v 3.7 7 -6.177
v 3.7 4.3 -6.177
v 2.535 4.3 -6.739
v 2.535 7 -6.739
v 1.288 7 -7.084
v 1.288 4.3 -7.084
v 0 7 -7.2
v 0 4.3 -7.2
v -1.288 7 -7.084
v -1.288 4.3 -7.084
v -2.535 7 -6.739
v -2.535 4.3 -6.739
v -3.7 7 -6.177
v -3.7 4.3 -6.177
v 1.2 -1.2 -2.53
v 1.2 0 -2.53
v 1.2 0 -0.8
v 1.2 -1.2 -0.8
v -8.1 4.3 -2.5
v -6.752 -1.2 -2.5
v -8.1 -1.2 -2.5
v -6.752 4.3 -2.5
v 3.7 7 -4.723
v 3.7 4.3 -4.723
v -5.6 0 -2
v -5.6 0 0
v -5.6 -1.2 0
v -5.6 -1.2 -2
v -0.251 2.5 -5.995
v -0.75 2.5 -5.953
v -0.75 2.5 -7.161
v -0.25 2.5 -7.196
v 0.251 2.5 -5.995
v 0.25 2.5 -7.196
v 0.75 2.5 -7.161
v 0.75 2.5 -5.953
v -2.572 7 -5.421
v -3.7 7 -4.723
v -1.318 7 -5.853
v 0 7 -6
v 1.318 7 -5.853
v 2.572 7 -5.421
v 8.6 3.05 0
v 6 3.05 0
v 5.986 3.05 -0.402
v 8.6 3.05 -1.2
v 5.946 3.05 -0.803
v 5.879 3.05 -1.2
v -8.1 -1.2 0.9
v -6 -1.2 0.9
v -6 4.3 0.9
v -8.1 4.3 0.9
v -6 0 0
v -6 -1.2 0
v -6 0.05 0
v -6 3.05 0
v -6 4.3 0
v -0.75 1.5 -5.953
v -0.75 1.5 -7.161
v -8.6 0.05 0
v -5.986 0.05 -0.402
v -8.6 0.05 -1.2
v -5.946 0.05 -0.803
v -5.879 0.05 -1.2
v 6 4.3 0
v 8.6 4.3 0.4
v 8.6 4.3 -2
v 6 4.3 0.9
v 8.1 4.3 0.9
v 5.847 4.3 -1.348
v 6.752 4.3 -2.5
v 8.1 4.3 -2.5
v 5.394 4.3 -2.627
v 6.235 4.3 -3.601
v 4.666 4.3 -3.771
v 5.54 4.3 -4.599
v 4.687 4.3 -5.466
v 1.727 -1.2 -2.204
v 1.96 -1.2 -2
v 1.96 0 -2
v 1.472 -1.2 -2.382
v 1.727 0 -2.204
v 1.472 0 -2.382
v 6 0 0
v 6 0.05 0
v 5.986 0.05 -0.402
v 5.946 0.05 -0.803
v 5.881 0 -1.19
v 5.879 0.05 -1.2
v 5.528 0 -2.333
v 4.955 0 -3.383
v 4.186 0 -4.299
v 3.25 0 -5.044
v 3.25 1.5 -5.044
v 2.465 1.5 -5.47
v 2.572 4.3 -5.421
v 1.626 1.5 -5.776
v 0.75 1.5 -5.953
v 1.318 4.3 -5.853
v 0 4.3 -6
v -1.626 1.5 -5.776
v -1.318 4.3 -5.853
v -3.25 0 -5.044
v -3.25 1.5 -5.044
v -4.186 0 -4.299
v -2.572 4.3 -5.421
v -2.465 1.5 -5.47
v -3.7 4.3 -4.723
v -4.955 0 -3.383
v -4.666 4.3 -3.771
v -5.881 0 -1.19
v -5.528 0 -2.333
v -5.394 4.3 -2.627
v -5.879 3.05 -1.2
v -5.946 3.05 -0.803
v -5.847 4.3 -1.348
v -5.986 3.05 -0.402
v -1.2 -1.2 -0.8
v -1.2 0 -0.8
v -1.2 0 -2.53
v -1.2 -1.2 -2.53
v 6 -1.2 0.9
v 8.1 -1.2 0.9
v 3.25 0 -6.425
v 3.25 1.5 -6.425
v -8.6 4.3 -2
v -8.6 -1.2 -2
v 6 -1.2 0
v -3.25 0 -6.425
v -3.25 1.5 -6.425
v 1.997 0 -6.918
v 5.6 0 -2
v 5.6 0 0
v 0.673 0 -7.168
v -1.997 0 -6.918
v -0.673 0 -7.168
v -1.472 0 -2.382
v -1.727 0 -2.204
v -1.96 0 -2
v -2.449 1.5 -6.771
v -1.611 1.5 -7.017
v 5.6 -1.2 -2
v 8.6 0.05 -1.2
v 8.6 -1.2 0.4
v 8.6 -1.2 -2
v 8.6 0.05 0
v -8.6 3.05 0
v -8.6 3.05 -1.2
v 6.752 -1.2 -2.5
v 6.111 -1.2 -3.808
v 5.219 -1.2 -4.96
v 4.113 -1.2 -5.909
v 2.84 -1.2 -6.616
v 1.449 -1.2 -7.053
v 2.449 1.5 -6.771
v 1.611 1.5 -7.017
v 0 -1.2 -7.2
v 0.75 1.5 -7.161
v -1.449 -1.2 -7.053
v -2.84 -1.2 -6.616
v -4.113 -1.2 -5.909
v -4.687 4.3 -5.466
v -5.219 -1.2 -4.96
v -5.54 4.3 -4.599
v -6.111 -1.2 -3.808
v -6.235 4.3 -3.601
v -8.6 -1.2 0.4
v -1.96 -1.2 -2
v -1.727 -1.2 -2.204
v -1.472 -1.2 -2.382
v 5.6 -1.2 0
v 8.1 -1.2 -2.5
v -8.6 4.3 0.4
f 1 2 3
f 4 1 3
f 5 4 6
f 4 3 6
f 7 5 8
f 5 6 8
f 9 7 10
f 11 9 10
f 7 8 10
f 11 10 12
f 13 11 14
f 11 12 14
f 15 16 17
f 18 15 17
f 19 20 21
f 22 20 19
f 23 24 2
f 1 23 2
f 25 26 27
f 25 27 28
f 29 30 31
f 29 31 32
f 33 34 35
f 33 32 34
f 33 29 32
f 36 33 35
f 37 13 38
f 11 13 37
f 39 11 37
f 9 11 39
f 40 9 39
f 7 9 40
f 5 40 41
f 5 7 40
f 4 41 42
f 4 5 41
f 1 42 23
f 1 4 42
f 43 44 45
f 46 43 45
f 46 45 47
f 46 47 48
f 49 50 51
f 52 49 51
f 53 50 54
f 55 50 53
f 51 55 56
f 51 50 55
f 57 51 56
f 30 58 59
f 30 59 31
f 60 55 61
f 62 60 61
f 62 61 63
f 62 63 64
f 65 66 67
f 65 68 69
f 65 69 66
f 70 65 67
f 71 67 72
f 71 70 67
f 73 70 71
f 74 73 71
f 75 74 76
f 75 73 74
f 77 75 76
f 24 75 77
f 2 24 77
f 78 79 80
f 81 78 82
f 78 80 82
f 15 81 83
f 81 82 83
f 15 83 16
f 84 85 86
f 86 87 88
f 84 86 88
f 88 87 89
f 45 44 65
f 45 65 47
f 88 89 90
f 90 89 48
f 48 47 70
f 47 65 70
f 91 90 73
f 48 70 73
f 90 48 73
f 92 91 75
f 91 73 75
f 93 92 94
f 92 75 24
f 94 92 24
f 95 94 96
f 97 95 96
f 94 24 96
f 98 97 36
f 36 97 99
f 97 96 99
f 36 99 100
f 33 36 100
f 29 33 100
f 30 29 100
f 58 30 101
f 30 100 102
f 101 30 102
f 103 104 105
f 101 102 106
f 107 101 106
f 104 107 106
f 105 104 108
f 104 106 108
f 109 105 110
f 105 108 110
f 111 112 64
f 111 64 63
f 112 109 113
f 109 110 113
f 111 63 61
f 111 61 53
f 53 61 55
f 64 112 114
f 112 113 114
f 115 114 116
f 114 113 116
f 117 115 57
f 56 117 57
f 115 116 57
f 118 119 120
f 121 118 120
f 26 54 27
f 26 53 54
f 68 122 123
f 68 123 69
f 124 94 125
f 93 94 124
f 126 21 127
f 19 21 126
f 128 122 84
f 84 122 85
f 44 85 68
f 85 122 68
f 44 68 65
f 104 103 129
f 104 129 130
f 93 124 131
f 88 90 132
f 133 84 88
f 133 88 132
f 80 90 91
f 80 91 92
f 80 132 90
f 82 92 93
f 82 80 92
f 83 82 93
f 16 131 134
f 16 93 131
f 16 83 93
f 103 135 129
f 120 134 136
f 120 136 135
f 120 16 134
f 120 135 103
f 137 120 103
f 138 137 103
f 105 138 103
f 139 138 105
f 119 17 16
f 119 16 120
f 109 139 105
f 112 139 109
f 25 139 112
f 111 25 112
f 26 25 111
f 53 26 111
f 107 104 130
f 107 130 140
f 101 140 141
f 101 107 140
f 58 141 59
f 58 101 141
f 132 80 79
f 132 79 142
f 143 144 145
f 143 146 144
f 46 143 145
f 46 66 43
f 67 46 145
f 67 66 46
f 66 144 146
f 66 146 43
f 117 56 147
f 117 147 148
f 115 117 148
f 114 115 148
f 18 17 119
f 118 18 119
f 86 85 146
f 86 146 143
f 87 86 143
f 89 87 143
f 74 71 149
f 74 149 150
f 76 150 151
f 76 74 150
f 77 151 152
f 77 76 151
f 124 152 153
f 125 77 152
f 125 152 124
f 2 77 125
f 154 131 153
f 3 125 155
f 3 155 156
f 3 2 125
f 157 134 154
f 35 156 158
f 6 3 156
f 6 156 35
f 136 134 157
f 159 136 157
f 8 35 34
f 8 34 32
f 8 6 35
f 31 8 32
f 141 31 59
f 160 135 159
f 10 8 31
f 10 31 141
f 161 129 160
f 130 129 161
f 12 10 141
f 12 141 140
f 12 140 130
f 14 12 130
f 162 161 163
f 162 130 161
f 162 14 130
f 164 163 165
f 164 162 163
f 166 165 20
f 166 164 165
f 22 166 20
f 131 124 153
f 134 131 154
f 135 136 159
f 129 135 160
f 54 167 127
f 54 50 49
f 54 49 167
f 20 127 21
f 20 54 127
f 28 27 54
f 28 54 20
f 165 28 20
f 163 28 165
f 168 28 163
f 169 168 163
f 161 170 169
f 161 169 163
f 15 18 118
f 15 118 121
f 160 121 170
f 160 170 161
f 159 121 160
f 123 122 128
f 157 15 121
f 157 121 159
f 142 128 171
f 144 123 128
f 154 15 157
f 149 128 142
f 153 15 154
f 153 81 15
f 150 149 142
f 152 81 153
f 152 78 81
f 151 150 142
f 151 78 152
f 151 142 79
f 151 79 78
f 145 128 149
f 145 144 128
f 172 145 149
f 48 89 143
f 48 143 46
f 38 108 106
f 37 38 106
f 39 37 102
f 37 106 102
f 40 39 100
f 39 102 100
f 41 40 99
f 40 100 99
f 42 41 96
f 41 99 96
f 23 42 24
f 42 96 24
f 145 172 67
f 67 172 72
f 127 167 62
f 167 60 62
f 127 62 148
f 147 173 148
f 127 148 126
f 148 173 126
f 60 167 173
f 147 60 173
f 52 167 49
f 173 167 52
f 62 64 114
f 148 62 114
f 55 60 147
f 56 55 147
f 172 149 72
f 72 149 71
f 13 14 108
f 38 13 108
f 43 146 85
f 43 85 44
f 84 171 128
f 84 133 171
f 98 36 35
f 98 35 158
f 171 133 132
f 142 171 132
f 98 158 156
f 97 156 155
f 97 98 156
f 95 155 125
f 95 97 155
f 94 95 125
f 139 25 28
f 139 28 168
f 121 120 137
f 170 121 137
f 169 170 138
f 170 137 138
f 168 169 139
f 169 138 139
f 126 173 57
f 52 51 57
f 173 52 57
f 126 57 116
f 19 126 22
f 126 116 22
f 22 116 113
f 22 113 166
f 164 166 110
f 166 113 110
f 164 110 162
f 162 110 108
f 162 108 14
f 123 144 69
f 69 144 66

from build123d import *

# Parameters (mm, degrees)
SKETCH1_W                = 6
SKETCH1_H                = 1.2
SKETCH1_W_2              = 1.2
SKETCH1_H_2              = 4.3
REVOLVE1_ANGLE           = 180
REVOLVE2_START           = 4.3
REVOLVE2_DEPTH           = 2.7
CUT_EXTRUDE1_DEPTH       = 10
CUT_EXTRUDE2_DEPTH       = 10
SKETCH9_W                = 3.4
SKETCH9_H                = 5.5
SKETCH9_W_2              = 1.2
SKETCH9_H_2              = 3
BOSS_EXTRUDE5_DEPTH      = 2.6
SKETCH11_W               = 1.2
SKETCH11_H               = 3
CUT_EXTRUDE3_DEPTH       = 3.6
CHAMFER2_SIZE            = 0.5
CHAMFER3_SIZE            = 0.5
CHAMFER2_OF_MIRROR2_SIZE = 0.5
CHAMFER3_OF_MIRROR2_SIZE = 0.5
SKETCH5_W                = 4
SKETCH5_H                = 2
CUT_EXTRUDE4_DEPTH       = 3.6


# Read off the part's stored shape, not the designer's step: Revolve2
with BuildPart() as part:
    # Sketch1 → Revolve1 (revolve)
    with BuildSketch(Plane.XY):
        with Locations((3, -0.6)):
            Rectangle(SKETCH1_W, SKETCH1_H)
        with Locations((6.6, -0.6)):
            Rectangle(SKETCH1_W_2, SKETCH1_H)
        with Locations((6.6, 2.15)):
            Rectangle(SKETCH1_W_2, SKETCH1_H_2)
    revolve(axis=Axis((0, -1.2, 0), (0, 1, 0)), revolution_arc=REVOLVE1_ANGLE)

    # Revolve2 outline → Revolve2 (add)
    with BuildSketch(Plane(origin=(0, 0, 0), x_dir=(1, 0, 0), z_dir=(0, 1, 0)).offset(REVOLVE2_START)):
        with BuildLine():
            ThreePointArc((3.7, 6.176568627), (0, 7.2), (-3.7, 6.176568627))
            Line((-3.7, 6.176568627), (-3.7, 4.723346271))
            ThreePointArc((-3.7, 4.723346271), (0, 6), (3.7, 4.723346271))
            Line((3.7, 4.723346271), (3.7, 6.176568627))
        make_face()
    extrude(amount=REVOLVE2_DEPTH)

    # Sketch3 → Cut-Extrude1 (cut)
    with BuildSketch(Plane.XY):
        Polygon((-3.25, 1.5), (-0.75, 1.5), (-0.75, 2.5), (0.75, 2.5), (0.75, 1.5), (3.25, 1.5), (3.25, 0), (-3.25, 0), align=None)
    extrude(amount=-CUT_EXTRUDE1_DEPTH, mode=Mode.SUBTRACT)

    # Sketch4 → Cut-Extrude2 (cut)
    with BuildSketch(Plane(origin=(0, 0, 0), x_dir=(1, 0, 0), z_dir=(0, 1, 0))):
        with BuildLine():
            Line((-1.2, 0.8), (-1.2, 2.529822128))
            ThreePointArc((-1.2, 2.529822128), (-2.366431913, 1.496662955), (-2.8, 0))
            Line((-2.8, 0), (2.8, 0))
            ThreePointArc((2.8, 0), (2.366431913, 1.496662955), (1.2, 2.529822128))
            Line((1.2, 2.529822128), (1.2, 0.8))
            Line((1.2, 0.8), (-1.2, 0.8))
        make_face()
    extrude(amount=-CUT_EXTRUDE2_DEPTH, mode=Mode.SUBTRACT)

    # Sketch9 → Boss-Extrude5 (add)
    with BuildSketch(Plane(origin=(6, 0, 0), x_dir=(0, 0, -1), z_dir=(1, 0, 0))):
        with Locations((0.8, 1.55)):
            Rectangle(SKETCH9_W, SKETCH9_H)
        with Locations((0.6, 1.55)):
            Rectangle(SKETCH9_W_2, SKETCH9_H_2, mode=Mode.SUBTRACT)
    boss_extrude5 = extrude(amount=BOSS_EXTRUDE5_DEPTH)

    # Sketch11 → Cut-Extrude3 (cut)
    with BuildSketch(Plane(origin=(8.6, 0, 0), x_dir=(0, 0, -1), z_dir=(1, 0, 0))):
        with Locations((0.6, 1.55)):
            Rectangle(SKETCH11_W, SKETCH11_H)
    cut_extrude3 = extrude(amount=-CUT_EXTRUDE3_DEPTH, mode=Mode.SUBTRACT)

    # Chamfer2
    chamfer2_edges = [part.edges().sort_by_distance(p)[0] for p in [
        (8.6, 1.55, 0.9),
    ]]
    chamfer(chamfer2_edges, length=CHAMFER2_SIZE)

    # Chamfer3
    chamfer3_edges = [part.edges().sort_by_distance(p)[0] for p in [
        (8.6, 1.55, -2.5),
    ]]
    chamfer(chamfer3_edges, length=CHAMFER3_SIZE)

    # Mirror2: Boss-Extrude5, Cut-Extrude3 across plane
    add(boss_extrude5.mirror(Plane(origin=(0, 0, 0), x_dir=(0, 0, 1), z_dir=(1, 0, 0))))
    add(cut_extrude3.mirror(Plane(origin=(0, 0, 0), x_dir=(0, 0, 1), z_dir=(1, 0, 0))), mode=Mode.SUBTRACT)

    # Chamfer2 of Mirror2
    chamfer2_of_mirror2_edges = [part.edges().sort_by_distance(p)[0] for p in [
        (-8.6, 1.55, 0.9),
    ]]
    chamfer(chamfer2_of_mirror2_edges, length=CHAMFER2_OF_MIRROR2_SIZE)

    # Chamfer3 of Mirror2
    chamfer3_of_mirror2_edges = [part.edges().sort_by_distance(p)[0] for p in [
        (-8.6, 1.55, -2.5),
    ]]
    chamfer(chamfer3_of_mirror2_edges, length=CHAMFER3_OF_MIRROR2_SIZE)

    # Sketch5 → Cut-Extrude4 (cut)
    with BuildSketch(Plane(origin=(0, 0, 0), x_dir=(1, 0, 0), z_dir=(0, 1, 0))):
        with Locations((-3.6, 1)):
            Rectangle(SKETCH5_W, SKETCH5_H)
        with Locations((3.6, 1)):
            Rectangle(SKETCH5_W, SKETCH5_H)
    extrude(amount=-CUT_EXTRUDE4_DEPTH, mode=Mode.SUBTRACT)


solid = part.part
